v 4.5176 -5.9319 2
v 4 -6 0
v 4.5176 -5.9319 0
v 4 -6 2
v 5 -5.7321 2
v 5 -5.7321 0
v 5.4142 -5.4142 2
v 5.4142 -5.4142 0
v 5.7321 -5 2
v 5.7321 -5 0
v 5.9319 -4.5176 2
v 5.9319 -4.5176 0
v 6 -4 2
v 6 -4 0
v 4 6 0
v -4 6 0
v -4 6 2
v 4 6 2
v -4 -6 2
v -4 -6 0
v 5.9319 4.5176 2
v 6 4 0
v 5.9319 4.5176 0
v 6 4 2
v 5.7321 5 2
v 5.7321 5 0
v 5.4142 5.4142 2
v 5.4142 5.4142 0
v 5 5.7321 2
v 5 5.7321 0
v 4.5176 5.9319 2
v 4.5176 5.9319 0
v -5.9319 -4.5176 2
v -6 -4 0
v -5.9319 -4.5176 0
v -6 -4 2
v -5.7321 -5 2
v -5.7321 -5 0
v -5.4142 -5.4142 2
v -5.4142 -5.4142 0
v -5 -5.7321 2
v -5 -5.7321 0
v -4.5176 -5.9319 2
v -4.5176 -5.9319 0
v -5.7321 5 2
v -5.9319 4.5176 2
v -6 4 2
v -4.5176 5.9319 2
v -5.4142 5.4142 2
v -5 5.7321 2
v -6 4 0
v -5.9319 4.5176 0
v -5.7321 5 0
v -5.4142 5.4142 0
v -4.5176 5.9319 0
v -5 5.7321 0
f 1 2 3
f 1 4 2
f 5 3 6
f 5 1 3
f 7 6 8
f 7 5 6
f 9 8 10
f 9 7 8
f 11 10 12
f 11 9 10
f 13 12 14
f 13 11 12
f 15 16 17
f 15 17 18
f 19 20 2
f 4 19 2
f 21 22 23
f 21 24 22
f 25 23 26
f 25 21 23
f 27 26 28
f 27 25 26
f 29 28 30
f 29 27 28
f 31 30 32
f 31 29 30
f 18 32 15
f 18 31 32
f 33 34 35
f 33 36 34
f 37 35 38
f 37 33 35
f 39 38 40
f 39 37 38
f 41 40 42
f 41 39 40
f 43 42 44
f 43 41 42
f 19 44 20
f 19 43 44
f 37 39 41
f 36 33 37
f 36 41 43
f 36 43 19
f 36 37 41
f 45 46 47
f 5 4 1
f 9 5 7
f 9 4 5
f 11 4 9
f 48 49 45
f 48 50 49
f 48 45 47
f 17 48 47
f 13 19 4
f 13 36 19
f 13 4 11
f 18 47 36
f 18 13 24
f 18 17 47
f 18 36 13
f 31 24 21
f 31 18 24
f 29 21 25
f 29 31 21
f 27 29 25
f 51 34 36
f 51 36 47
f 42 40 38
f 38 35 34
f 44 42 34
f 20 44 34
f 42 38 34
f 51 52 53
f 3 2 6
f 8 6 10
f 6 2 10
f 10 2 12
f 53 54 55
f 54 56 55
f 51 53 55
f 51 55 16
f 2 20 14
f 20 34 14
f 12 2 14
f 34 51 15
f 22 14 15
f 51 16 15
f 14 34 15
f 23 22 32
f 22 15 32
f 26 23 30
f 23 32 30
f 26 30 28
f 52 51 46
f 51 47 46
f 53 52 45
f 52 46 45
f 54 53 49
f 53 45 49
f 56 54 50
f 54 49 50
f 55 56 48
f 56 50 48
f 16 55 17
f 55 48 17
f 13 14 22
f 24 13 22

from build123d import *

# Parameters (mm, degrees)
ESBO_O1_W                = 12
ESBO_O1_H                = 12
RESSALTO_EXTRUS_O1_DEPTH = 2
FILETE1_R                = 2


with BuildPart() as part:
    # Esboço1 → Ressalto-extrusão1 (new body)
    with BuildSketch(Plane.XY):
        Rectangle(ESBO_O1_W, ESBO_O1_H)
    extrude(amount=RESSALTO_EXTRUS_O1_DEPTH)

    # Filete1
    filete1_edges = [part.edges().sort_by_distance(p)[0] for p in [
        (-6, 6, 1),
        (6, 6, 1),
        (6, -6, 1),
        (-6, -6, 1),
    ]]
    fillet(filete1_edges, radius=FILETE1_R)


solid = part.part
